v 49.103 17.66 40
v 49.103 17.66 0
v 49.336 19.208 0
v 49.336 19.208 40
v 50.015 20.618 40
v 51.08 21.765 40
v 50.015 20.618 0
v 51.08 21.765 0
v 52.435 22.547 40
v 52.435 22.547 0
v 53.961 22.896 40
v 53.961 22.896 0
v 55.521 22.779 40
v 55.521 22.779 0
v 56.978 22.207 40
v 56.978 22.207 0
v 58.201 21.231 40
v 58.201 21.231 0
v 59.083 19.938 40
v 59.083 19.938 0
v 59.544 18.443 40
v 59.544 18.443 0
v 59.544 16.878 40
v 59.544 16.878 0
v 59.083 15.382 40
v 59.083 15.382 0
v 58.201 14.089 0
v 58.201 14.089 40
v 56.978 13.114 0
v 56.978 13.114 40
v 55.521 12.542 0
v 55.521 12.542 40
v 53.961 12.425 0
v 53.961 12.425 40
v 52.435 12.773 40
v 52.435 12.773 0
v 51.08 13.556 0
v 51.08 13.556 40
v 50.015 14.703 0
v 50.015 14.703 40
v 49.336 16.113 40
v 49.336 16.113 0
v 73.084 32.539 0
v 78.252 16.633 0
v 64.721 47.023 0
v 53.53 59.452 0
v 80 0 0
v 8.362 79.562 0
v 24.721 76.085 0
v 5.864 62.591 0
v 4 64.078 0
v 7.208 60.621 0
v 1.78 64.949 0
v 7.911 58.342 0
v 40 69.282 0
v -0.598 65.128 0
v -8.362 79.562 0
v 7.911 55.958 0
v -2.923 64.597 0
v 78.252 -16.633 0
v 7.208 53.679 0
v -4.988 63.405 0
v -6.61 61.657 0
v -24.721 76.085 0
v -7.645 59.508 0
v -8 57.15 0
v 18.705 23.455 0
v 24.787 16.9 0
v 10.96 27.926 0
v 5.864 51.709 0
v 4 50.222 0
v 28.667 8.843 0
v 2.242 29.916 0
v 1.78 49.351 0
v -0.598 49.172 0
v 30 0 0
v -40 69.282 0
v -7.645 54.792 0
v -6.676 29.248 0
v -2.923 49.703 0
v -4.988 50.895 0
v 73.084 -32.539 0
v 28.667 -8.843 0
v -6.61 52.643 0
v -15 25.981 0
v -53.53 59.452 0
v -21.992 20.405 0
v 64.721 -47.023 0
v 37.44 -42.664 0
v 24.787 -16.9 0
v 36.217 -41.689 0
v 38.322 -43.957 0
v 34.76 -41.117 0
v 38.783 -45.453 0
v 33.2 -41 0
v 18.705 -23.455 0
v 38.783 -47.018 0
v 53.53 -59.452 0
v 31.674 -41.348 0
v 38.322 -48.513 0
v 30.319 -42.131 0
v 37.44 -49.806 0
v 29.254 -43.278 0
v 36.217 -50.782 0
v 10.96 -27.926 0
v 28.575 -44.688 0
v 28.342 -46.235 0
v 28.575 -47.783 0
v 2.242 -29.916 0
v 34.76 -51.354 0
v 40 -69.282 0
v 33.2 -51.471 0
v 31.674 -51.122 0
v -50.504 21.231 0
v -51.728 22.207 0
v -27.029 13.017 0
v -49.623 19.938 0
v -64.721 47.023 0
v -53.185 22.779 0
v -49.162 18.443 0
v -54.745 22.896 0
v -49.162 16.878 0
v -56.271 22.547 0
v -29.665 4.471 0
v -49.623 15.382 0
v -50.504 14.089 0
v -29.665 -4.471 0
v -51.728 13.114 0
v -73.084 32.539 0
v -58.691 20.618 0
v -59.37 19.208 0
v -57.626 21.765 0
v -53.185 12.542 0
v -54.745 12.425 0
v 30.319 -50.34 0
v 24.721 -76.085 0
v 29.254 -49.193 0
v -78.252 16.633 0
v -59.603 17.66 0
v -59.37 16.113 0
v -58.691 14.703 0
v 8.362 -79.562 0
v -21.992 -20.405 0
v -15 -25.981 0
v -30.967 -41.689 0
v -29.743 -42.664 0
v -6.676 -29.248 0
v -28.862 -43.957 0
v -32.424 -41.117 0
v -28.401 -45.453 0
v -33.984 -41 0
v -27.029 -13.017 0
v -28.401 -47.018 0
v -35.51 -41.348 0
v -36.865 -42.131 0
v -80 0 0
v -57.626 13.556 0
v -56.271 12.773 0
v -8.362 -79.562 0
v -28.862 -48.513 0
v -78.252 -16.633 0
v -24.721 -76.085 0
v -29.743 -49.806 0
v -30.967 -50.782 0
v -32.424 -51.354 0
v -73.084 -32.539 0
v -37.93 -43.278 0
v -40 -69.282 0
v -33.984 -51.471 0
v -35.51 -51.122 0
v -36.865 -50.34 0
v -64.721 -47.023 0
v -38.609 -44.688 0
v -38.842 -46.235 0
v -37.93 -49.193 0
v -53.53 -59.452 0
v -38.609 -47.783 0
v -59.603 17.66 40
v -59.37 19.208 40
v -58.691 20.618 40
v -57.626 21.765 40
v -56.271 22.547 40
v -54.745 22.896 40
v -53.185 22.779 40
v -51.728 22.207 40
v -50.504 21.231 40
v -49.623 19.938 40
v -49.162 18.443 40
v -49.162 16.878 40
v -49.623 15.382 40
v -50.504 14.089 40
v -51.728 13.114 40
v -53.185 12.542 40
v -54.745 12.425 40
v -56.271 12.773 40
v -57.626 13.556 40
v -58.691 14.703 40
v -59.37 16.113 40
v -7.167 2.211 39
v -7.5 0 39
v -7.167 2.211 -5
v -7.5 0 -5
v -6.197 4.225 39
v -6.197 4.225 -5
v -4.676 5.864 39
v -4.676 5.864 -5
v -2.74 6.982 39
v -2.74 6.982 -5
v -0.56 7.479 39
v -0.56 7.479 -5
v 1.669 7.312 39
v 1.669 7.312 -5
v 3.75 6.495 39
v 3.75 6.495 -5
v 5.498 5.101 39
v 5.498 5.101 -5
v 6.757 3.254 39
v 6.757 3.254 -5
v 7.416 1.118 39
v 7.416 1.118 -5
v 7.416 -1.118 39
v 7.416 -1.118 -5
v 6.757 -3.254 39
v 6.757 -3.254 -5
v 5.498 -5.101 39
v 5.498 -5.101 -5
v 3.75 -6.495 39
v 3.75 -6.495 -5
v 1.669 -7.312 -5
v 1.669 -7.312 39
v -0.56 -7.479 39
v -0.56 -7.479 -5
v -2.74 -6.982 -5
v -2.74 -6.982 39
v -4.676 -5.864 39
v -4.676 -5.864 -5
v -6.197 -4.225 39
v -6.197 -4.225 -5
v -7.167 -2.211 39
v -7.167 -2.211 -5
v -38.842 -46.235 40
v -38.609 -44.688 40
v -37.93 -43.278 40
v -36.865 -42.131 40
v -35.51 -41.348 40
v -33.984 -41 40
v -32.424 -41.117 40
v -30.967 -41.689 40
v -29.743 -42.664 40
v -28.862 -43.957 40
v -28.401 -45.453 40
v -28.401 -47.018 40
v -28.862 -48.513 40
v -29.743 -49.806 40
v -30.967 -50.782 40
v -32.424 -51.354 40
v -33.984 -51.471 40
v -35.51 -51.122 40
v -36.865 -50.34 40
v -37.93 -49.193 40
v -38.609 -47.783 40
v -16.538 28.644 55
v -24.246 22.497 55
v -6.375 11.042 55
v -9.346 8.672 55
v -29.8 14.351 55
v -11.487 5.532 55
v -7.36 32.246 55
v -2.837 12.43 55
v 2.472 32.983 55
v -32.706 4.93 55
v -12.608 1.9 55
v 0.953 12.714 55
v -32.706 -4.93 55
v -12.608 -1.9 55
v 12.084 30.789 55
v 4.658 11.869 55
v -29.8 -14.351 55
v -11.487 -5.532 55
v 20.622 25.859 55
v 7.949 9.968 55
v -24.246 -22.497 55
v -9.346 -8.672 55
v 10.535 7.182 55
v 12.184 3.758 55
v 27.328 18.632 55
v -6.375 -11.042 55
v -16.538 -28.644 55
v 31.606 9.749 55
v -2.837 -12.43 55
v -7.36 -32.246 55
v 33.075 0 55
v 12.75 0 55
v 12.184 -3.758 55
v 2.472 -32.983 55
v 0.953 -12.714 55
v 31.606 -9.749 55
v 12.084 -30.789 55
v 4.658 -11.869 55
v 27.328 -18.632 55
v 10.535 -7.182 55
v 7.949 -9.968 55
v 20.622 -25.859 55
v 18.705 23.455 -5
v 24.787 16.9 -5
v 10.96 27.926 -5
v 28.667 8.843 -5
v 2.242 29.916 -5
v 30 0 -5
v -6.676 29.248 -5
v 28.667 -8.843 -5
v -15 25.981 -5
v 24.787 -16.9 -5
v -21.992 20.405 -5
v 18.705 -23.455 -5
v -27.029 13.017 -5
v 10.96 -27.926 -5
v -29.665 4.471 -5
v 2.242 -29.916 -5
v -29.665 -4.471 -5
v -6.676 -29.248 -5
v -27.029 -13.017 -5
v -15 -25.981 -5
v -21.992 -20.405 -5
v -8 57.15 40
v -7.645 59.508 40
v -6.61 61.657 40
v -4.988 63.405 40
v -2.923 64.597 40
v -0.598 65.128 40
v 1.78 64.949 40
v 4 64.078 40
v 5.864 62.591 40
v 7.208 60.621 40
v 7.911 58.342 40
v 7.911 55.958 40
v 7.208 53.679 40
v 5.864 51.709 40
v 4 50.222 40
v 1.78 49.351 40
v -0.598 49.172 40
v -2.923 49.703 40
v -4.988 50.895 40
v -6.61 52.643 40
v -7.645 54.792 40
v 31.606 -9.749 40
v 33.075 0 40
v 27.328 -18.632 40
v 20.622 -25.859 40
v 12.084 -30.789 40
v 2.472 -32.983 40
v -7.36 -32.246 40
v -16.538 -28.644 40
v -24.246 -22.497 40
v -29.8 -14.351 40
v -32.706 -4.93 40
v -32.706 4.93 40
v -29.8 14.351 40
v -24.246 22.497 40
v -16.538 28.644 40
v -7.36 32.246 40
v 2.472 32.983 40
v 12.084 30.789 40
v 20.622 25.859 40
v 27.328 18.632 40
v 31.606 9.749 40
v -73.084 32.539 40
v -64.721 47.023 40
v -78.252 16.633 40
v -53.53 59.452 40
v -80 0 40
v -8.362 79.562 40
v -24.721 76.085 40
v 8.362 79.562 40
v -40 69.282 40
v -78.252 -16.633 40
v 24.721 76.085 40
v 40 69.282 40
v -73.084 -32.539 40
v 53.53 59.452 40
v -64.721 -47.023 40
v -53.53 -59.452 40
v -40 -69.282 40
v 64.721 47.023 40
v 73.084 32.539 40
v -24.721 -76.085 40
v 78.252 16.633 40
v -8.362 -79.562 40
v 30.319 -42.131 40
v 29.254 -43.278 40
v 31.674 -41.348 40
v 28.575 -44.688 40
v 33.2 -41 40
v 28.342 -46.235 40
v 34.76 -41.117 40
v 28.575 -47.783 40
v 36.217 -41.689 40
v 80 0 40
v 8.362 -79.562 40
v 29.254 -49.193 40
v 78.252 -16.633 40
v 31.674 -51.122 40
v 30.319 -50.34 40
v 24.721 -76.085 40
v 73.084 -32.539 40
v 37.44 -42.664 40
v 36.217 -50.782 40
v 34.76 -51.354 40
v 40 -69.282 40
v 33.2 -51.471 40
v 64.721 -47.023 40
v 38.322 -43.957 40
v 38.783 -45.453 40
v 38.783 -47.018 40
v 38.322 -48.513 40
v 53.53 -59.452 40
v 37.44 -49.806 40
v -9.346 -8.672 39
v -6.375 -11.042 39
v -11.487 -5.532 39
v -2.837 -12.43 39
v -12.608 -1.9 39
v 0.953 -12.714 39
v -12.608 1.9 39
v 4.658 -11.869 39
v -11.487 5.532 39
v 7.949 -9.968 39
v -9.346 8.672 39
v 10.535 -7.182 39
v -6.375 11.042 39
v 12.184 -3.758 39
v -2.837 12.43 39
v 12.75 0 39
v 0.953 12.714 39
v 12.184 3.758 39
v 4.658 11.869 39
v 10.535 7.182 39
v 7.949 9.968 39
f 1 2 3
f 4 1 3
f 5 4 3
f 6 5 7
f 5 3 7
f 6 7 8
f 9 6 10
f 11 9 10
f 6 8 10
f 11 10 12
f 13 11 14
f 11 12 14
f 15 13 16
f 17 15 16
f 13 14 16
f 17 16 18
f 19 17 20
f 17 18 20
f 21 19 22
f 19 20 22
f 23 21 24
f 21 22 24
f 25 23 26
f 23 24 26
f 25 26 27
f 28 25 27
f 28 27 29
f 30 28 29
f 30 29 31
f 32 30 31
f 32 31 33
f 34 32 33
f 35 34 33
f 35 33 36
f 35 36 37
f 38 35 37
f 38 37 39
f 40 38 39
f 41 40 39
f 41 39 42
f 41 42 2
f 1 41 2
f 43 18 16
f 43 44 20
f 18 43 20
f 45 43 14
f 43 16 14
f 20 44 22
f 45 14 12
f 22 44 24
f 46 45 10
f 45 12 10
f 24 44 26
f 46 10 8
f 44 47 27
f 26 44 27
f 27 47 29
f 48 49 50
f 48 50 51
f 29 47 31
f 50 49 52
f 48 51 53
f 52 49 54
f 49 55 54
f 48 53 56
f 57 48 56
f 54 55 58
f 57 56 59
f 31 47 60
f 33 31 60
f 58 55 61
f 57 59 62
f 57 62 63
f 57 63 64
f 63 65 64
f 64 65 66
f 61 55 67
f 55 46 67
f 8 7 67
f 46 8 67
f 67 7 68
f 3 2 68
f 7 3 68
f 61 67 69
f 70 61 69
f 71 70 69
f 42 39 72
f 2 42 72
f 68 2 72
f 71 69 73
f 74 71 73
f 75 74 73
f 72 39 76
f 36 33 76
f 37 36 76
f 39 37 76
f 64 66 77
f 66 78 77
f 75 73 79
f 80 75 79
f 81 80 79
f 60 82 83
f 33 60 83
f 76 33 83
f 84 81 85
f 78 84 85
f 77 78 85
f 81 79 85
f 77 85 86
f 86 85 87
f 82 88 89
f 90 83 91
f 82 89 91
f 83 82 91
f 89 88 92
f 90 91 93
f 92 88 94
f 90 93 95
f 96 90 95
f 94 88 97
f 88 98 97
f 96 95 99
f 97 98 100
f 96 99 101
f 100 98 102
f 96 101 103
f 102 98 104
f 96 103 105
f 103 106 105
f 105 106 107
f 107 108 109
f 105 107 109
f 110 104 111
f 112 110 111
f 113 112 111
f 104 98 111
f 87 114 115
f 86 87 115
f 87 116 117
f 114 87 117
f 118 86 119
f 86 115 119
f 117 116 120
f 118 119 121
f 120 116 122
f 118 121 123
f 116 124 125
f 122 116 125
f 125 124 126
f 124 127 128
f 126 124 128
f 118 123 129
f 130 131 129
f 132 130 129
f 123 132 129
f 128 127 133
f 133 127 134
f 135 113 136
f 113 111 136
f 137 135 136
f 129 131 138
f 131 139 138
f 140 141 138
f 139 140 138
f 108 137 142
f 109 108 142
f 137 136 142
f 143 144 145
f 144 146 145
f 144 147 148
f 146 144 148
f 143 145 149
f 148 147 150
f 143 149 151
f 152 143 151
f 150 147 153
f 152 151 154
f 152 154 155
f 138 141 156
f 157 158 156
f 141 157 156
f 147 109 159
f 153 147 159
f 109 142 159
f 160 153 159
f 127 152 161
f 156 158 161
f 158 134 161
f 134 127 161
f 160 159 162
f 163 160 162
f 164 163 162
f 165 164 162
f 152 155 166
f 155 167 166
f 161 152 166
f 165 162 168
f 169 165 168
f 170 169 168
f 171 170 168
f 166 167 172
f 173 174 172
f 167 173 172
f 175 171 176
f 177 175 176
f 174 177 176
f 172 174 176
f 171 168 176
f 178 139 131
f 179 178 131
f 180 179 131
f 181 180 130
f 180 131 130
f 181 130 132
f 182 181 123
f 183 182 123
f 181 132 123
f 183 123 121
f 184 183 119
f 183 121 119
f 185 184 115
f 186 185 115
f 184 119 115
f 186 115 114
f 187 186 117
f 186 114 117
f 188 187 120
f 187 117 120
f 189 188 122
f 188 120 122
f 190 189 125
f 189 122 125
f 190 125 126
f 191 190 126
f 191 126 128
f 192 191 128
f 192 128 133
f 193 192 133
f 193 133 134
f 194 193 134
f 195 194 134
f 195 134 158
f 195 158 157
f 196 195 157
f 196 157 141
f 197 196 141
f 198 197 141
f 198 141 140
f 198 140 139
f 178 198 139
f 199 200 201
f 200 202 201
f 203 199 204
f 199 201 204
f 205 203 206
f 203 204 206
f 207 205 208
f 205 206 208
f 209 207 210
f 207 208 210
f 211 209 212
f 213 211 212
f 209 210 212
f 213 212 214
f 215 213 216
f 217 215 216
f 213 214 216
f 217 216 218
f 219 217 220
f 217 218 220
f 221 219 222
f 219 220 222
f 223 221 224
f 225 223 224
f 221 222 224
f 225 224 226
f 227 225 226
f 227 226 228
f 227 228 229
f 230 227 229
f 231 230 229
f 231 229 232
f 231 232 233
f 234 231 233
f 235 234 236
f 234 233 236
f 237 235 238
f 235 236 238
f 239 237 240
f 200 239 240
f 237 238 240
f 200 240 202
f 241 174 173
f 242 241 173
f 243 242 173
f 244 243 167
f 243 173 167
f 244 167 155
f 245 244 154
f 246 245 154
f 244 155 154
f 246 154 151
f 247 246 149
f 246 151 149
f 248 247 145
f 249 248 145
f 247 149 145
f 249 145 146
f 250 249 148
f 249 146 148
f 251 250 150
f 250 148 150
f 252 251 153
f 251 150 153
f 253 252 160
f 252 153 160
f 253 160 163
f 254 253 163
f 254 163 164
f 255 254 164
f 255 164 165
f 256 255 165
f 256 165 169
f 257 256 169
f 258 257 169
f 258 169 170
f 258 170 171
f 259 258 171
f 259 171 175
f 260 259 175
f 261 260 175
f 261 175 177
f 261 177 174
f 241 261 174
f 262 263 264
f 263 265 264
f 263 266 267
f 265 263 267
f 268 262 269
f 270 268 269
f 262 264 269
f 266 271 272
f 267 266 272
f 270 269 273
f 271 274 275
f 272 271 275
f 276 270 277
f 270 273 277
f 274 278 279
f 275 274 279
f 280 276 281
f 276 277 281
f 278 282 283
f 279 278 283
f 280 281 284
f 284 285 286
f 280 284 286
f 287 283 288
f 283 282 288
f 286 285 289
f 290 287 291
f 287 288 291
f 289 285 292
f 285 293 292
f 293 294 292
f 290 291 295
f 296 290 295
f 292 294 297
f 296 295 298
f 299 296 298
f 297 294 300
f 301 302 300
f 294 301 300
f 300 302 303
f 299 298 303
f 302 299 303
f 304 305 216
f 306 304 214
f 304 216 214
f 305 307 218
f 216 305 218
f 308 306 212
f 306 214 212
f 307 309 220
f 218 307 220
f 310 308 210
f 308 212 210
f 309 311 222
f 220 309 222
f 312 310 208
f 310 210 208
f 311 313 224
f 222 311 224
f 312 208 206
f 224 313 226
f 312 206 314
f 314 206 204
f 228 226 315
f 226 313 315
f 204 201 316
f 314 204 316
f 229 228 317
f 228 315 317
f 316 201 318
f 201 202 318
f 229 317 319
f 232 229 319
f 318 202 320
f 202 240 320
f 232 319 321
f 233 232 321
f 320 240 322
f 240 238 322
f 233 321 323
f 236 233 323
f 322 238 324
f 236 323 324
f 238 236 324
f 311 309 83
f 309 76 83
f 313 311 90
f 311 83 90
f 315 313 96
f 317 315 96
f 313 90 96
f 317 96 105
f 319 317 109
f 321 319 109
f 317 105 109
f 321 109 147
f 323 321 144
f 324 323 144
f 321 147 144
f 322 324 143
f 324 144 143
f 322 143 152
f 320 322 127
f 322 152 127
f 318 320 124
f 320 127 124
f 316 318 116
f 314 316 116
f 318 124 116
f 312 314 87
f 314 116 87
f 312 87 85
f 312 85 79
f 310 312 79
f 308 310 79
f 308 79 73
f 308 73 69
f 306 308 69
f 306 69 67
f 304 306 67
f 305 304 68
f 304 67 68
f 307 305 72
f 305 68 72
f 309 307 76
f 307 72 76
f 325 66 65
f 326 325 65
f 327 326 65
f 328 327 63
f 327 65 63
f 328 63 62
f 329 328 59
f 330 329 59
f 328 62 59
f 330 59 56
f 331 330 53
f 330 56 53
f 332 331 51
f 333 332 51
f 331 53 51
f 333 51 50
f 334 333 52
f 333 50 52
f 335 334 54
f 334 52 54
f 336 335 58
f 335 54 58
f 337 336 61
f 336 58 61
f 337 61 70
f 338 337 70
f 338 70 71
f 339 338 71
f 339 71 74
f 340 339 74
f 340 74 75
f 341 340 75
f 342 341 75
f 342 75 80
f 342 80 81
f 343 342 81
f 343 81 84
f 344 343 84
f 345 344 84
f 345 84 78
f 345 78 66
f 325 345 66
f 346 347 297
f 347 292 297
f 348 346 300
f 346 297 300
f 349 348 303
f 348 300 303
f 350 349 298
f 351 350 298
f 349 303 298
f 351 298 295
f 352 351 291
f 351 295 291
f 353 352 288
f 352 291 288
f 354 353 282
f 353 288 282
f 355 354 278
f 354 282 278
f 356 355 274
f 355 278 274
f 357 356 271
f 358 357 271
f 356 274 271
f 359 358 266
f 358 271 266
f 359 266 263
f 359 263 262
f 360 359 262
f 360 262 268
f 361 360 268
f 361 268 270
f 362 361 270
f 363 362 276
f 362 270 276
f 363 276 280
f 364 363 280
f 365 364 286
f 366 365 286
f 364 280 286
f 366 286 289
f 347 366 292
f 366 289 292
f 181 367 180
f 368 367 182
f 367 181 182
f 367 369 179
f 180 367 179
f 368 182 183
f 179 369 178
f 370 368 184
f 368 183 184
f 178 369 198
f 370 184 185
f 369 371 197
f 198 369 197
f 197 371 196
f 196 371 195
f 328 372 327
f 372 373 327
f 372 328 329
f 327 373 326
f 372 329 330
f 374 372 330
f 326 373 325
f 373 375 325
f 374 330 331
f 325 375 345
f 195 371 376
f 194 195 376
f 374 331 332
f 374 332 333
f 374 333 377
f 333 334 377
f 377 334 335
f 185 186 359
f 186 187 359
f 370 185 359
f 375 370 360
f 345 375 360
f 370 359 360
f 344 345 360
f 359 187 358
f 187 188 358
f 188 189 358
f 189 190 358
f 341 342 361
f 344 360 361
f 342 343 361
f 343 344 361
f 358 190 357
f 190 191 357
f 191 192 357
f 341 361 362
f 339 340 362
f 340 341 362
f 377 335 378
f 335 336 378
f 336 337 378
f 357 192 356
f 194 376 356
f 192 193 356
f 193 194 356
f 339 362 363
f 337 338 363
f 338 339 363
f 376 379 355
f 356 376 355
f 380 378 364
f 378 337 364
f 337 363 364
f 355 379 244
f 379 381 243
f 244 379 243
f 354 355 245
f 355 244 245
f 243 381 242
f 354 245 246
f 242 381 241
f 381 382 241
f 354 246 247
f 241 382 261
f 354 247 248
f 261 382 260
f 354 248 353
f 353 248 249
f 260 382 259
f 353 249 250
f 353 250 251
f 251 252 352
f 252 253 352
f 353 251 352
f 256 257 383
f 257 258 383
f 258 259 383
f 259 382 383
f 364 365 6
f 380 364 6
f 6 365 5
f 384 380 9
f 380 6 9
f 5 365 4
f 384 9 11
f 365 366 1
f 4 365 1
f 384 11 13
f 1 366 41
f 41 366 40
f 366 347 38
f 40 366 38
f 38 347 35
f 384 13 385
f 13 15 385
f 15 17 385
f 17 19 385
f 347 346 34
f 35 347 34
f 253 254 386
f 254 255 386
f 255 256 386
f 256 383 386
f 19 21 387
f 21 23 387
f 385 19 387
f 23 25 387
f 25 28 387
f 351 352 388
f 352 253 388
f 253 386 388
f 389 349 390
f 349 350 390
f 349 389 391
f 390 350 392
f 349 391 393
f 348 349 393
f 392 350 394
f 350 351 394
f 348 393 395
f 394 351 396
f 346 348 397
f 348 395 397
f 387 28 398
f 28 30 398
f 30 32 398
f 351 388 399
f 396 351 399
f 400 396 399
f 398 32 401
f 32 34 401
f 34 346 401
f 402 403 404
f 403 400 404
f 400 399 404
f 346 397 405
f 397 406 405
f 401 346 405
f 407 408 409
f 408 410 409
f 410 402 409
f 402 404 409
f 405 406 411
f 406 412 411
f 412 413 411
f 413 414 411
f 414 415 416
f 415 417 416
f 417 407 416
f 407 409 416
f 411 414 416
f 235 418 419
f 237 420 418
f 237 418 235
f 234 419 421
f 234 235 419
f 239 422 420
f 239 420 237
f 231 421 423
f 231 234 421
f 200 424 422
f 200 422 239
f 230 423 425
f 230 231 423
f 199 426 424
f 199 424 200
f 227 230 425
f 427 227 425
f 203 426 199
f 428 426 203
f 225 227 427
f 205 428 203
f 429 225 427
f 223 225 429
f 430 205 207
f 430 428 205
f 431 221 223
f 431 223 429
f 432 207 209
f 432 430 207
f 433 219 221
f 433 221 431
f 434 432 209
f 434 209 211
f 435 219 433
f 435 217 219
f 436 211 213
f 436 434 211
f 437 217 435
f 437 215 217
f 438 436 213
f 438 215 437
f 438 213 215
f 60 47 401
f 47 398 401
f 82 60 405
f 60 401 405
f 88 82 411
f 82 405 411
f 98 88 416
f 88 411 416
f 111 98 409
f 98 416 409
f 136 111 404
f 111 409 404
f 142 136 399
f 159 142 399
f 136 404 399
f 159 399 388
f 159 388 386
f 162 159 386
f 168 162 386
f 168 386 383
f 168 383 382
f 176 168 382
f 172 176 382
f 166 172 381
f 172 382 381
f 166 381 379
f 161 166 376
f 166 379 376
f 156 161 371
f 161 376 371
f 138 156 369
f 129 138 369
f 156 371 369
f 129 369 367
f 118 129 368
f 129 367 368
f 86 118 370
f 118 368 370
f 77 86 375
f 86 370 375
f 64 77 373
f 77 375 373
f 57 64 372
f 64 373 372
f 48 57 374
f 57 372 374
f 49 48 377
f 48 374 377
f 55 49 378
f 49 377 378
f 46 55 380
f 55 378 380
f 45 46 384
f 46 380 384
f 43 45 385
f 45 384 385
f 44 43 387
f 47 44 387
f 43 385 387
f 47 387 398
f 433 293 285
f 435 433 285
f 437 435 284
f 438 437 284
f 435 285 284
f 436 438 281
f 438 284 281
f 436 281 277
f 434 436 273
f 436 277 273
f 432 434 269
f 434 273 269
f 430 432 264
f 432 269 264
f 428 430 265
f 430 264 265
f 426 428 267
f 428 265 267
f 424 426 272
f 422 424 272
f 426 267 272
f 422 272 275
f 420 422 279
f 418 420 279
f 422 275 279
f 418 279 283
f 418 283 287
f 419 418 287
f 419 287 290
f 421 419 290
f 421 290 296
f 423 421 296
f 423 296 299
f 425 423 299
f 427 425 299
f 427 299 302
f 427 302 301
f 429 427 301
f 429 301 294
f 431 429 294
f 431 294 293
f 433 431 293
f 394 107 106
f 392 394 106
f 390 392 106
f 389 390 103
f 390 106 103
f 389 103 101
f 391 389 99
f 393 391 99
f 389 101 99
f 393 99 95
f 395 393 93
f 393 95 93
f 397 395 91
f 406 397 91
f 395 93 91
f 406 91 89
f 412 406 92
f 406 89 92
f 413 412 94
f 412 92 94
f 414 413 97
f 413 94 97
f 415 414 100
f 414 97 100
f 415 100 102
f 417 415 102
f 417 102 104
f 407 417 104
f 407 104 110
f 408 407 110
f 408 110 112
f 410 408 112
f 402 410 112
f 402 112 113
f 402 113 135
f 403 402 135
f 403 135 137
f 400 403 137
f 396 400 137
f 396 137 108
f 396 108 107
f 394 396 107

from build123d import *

# Parameters (mm, degrees)
F4_D           = 15
F4_CBORE_D     = 25.5
F4_CBORE_DEPTH = 16
F5_D           = 10.5
F6_D           = 16


with BuildPart() as f1:
    # F0 (on Front) → F1 (revolve)
    with BuildSketch(Plane.XZ):
        Polygon((30, -5), (30, 0), (80, 0), (80, 40), (33.075, 40), (33.075, 55), (0, 55), (0, 0), (0, -5), align=None)
    revolve(axis=Axis((0, 0, 27.5), (0, 0, -1)))

    # F4 (through all)
    with Locations(Plane.XY.offset(55)):
        with Locations((0, 0)):
            CounterBoreHole(F4_D / 2, F4_CBORE_D / 2, F4_CBORE_DEPTH)

    # F5 (through all)
    with Locations(Plane.XY.offset(40)):
        with Locations((-54.3528799063, 17.6603212285), (-33.5919271685, -46.2353212285), (33.5919271685, -46.2353212285), (54.3528799063, 17.6603212285)):
            Hole(F5_D / 2)

    # F6 (through all)
    with Locations(Plane.XY.offset(40)):
        with Locations((0, 57.15)):
            Hole(F6_D / 2)


solid = f1.part
